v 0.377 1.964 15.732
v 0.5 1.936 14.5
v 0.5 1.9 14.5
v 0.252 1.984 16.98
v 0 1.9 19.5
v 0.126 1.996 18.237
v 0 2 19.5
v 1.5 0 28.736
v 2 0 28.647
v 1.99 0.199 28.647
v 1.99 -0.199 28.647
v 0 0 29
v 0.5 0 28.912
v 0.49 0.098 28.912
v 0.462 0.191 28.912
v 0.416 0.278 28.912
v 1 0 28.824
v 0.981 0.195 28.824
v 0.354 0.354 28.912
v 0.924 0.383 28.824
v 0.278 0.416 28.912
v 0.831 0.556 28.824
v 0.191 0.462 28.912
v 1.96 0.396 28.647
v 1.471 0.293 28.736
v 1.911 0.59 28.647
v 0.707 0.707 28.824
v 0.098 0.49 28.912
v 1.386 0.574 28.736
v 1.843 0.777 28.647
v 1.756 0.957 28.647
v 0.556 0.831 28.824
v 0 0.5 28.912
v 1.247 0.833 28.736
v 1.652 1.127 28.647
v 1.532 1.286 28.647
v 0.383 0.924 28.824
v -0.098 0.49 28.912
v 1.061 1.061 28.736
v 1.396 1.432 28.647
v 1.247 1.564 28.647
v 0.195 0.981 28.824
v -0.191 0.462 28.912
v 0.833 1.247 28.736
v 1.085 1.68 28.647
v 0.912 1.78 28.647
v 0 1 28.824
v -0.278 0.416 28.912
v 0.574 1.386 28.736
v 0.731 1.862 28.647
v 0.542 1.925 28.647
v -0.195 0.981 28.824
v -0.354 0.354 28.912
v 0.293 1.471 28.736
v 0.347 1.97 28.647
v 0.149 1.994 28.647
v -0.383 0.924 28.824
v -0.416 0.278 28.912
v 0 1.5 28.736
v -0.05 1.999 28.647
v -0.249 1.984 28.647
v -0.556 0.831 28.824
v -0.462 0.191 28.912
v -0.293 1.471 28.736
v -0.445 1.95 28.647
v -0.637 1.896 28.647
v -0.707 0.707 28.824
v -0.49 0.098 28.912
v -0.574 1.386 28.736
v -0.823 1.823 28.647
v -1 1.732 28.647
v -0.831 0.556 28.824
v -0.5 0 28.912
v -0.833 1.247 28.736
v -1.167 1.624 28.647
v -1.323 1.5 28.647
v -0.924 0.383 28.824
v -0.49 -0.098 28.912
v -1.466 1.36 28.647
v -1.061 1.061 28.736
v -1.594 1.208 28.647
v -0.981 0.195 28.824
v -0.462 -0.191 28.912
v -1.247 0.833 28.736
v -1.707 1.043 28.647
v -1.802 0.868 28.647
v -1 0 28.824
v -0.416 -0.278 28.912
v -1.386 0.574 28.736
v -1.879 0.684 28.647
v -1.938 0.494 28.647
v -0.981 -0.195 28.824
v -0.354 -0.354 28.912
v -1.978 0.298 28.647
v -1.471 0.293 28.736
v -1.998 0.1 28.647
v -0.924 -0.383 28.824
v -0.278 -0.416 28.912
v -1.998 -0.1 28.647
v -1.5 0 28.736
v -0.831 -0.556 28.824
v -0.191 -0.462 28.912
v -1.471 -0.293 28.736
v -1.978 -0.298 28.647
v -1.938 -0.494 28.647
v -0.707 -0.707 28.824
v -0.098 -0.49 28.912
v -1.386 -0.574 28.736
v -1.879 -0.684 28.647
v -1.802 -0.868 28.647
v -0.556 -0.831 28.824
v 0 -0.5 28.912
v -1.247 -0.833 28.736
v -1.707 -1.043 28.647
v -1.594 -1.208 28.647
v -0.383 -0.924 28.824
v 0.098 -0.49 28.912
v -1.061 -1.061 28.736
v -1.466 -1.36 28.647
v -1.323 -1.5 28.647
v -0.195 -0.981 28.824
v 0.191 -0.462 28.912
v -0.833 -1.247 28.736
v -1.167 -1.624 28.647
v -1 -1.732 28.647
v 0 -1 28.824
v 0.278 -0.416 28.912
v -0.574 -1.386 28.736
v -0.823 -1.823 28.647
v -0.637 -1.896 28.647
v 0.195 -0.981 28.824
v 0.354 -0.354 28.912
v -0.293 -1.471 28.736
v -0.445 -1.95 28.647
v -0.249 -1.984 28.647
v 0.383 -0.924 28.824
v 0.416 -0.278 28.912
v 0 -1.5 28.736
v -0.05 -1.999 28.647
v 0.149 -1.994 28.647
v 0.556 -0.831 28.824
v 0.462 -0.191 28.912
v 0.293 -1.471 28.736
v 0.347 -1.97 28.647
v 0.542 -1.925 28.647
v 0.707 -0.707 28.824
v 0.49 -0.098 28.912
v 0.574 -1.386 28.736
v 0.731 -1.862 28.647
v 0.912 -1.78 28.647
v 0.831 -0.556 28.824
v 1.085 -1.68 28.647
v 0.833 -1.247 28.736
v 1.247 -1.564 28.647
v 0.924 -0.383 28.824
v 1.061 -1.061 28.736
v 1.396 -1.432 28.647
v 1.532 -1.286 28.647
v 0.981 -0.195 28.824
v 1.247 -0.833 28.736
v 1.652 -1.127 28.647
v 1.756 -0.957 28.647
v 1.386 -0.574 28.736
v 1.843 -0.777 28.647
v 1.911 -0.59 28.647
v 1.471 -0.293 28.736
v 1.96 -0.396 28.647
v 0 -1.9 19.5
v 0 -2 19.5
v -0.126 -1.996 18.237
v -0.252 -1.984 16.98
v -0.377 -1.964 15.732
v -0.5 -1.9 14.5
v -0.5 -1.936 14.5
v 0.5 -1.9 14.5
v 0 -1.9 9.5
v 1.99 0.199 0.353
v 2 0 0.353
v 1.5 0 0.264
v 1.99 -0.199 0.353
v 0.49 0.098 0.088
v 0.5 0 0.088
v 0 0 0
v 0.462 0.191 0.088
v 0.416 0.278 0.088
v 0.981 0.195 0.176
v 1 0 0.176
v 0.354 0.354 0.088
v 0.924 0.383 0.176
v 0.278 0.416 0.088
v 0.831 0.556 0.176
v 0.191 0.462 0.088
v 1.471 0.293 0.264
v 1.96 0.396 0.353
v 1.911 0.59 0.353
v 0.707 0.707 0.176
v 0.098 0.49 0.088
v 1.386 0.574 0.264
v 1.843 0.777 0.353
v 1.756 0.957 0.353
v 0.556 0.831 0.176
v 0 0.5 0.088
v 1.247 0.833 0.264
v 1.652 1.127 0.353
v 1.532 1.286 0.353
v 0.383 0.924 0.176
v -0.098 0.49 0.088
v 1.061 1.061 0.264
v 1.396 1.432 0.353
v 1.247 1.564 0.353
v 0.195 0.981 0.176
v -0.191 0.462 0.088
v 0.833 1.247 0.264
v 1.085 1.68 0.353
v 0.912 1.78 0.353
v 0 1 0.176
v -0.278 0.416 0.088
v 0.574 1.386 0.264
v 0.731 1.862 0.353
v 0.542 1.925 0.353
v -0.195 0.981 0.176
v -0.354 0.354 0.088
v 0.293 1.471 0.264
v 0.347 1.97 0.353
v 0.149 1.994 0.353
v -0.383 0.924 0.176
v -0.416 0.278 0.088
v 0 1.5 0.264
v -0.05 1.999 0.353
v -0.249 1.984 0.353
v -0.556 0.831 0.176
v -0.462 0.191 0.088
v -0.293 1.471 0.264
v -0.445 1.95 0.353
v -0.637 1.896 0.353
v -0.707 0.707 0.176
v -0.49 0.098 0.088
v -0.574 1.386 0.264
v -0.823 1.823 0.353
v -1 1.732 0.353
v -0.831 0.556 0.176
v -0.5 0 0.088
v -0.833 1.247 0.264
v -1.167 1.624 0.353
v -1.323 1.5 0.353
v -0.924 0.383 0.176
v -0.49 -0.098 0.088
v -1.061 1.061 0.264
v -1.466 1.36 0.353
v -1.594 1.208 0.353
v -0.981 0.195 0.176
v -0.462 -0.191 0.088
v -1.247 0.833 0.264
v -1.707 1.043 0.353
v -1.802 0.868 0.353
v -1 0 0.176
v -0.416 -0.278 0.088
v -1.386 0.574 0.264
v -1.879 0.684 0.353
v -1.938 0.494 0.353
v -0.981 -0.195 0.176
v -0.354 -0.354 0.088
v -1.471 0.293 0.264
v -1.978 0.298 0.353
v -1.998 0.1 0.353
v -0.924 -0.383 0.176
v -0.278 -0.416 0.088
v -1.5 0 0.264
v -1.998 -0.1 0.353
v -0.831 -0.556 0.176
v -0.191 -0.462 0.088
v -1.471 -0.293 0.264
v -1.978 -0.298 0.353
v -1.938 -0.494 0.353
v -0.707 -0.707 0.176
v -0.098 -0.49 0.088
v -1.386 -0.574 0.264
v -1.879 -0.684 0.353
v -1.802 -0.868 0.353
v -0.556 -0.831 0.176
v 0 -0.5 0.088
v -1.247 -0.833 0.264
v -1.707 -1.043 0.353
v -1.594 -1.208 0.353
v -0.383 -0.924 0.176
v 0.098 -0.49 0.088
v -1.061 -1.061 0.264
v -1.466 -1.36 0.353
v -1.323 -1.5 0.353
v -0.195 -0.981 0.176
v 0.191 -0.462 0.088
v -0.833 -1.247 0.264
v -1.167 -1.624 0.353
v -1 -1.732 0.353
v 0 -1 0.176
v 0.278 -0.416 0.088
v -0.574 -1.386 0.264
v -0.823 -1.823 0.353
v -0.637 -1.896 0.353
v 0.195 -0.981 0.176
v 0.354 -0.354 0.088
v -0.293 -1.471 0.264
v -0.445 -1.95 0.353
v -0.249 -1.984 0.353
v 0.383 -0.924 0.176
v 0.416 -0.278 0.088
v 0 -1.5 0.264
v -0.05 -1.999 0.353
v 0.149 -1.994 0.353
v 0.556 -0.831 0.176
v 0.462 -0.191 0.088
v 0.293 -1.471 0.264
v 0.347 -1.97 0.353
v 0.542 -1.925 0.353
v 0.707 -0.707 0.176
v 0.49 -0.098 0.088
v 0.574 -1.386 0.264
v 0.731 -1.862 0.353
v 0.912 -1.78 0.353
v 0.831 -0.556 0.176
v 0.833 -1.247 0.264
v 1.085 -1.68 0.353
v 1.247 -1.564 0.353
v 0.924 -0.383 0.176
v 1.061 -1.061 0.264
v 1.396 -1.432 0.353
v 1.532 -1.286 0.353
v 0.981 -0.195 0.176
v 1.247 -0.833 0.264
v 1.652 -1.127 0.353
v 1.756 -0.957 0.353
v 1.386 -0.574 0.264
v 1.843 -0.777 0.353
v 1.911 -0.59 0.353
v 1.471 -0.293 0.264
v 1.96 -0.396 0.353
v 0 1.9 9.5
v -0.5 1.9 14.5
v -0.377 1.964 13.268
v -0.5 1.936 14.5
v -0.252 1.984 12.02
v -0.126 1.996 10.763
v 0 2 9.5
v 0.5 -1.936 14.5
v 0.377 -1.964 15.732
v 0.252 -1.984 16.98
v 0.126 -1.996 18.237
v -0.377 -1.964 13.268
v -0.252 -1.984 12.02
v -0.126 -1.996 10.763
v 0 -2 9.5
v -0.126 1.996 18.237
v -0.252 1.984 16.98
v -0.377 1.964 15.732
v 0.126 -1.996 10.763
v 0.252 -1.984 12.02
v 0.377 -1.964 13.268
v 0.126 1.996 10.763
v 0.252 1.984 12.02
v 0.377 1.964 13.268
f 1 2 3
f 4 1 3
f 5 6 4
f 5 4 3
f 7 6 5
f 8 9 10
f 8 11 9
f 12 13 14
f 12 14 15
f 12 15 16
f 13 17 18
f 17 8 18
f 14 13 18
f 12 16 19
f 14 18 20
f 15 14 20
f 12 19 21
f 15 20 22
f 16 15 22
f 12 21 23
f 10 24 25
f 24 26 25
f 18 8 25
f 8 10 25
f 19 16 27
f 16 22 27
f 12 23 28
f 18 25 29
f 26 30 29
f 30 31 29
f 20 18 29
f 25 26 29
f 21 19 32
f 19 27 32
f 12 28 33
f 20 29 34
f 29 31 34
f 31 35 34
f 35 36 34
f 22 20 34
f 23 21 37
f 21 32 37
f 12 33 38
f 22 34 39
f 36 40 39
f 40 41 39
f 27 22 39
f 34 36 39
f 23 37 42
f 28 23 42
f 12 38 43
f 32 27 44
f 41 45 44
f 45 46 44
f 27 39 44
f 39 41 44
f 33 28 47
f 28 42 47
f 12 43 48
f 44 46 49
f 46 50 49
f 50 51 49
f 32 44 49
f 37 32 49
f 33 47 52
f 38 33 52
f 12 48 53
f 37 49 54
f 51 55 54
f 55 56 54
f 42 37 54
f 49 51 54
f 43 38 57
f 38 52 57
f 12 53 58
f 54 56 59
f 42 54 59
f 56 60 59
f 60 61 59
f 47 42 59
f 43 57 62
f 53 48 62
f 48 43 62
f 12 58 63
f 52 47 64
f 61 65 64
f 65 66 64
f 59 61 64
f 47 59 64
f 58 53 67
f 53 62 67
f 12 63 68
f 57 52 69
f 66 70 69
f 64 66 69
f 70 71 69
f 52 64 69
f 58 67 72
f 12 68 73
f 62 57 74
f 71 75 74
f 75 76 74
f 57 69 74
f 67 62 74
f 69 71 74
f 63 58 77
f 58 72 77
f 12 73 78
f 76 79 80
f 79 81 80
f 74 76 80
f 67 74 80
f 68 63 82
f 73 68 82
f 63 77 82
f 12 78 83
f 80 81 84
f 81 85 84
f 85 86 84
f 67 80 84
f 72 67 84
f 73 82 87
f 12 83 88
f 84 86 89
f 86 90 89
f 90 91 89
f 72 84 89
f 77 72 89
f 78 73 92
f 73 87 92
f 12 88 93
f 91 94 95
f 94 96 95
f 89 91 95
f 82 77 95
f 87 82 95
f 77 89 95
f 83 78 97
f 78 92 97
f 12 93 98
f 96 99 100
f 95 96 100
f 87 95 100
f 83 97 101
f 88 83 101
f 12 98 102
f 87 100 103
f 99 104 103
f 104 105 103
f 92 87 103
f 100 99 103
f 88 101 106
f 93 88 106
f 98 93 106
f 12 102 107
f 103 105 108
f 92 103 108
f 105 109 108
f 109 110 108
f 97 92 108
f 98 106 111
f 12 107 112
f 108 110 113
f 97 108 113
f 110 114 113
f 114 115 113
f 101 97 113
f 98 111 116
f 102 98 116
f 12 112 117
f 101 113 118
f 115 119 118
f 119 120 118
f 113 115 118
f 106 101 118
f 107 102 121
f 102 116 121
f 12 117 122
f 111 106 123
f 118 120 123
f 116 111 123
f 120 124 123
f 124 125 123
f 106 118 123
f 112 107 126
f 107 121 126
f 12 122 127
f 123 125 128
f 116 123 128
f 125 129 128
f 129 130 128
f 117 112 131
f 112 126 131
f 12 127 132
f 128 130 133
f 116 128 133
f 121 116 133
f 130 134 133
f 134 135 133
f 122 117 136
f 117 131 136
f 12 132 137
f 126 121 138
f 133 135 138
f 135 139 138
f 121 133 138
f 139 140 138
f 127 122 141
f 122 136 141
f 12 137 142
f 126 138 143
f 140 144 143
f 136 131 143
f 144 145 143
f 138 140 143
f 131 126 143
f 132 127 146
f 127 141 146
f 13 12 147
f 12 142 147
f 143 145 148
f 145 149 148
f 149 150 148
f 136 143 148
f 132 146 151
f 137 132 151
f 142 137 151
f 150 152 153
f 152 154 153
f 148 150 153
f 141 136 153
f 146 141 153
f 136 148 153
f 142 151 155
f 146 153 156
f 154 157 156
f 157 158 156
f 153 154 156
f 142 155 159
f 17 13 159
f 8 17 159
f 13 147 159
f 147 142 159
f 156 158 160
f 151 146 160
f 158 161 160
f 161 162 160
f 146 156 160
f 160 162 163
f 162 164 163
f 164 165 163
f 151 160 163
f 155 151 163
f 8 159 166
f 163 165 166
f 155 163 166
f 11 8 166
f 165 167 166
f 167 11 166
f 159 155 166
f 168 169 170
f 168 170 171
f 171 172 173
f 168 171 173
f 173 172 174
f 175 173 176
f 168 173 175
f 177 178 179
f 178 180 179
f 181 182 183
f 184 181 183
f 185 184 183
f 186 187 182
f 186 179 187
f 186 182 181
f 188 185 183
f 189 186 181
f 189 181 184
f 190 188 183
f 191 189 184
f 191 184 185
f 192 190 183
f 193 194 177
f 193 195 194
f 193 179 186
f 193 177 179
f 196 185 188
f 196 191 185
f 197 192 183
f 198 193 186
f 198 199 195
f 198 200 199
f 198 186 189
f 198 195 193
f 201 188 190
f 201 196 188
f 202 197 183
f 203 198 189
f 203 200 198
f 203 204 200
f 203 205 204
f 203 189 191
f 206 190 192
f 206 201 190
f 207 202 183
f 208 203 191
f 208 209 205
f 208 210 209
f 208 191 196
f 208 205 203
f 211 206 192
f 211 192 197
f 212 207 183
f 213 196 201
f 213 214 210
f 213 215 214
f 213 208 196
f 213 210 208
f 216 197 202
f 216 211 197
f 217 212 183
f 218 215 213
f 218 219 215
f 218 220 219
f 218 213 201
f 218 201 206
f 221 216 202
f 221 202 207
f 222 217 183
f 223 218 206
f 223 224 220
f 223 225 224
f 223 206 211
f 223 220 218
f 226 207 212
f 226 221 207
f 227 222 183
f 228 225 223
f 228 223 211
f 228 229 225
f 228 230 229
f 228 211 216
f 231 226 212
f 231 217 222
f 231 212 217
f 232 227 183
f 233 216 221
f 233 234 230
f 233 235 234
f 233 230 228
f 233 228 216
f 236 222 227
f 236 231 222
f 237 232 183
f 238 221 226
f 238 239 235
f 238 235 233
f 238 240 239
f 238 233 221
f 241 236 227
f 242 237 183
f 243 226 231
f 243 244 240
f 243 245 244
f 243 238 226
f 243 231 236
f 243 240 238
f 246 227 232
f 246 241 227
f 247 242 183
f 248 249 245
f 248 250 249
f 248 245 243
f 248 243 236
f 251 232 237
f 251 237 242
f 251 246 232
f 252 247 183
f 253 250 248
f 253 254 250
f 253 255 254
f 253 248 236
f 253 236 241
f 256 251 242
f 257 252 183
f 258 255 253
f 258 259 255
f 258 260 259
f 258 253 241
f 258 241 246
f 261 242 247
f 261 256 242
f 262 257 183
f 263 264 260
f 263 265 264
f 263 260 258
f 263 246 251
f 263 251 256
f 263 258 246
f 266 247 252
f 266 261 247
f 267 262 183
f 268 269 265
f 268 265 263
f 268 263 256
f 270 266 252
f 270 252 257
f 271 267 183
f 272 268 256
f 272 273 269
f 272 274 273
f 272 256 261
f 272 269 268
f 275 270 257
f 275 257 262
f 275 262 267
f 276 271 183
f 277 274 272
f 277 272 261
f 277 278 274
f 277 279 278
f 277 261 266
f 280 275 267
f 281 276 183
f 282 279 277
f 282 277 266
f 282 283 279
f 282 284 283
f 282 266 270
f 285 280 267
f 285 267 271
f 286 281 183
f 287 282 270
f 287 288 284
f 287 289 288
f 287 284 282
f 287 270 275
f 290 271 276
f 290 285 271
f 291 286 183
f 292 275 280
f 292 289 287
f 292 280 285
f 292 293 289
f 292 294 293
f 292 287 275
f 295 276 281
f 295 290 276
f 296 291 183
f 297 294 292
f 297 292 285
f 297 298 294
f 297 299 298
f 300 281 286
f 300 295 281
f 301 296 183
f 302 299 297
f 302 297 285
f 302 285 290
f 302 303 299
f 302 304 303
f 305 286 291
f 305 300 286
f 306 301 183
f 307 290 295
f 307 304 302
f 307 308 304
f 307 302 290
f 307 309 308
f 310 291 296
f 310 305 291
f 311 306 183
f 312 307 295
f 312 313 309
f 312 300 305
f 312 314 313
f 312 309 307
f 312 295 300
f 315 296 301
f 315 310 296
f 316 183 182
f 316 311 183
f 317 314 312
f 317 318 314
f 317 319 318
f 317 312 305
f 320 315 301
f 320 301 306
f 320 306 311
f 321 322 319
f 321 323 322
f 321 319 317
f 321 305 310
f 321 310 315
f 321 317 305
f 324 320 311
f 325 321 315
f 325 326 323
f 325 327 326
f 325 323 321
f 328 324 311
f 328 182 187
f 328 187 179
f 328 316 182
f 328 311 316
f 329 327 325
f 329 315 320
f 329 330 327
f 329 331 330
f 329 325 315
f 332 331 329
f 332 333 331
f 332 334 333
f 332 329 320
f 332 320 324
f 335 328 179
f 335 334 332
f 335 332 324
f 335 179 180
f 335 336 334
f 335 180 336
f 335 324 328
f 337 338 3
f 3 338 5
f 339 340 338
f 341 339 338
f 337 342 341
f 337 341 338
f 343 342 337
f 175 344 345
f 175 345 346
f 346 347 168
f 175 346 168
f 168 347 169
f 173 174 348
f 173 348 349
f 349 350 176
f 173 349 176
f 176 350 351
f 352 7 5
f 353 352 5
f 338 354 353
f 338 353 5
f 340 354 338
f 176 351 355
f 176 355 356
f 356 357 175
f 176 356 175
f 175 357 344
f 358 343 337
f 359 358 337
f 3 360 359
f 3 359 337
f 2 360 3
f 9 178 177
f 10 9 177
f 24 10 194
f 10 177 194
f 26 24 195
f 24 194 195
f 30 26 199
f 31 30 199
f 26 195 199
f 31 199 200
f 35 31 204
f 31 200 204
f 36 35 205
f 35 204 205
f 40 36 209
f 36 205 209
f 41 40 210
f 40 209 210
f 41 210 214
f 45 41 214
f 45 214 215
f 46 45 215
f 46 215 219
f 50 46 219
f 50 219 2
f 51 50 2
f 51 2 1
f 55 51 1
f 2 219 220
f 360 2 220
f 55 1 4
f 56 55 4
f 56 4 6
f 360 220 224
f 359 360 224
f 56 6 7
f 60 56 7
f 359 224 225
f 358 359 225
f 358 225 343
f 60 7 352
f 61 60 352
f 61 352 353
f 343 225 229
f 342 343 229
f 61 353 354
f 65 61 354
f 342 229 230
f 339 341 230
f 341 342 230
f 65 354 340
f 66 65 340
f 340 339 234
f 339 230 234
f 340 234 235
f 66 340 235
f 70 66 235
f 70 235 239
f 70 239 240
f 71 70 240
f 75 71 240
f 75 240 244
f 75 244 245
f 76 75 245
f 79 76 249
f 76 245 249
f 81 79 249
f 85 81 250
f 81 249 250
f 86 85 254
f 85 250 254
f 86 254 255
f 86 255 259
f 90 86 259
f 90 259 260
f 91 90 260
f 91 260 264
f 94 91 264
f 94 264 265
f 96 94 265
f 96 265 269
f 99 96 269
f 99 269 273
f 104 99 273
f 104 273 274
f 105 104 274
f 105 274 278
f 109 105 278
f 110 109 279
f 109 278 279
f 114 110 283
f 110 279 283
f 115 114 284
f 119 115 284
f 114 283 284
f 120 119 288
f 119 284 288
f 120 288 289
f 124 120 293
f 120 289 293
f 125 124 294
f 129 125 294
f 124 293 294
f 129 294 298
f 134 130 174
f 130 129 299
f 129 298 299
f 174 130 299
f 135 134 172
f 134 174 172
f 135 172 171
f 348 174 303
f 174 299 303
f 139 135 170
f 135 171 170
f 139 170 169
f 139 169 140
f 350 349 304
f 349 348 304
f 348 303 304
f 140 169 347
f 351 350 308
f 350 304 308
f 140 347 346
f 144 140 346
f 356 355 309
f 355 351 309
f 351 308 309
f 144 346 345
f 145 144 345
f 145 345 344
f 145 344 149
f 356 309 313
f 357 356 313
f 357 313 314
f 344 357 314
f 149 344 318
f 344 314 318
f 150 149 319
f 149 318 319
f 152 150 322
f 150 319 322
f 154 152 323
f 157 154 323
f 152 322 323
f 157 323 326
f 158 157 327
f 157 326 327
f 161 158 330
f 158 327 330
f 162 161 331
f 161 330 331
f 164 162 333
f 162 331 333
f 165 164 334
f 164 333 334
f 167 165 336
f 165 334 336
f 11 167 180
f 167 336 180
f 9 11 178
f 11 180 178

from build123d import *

# Parameters (mm, degrees)
F0_R       = 2
F1_DEPTH   = 29
F2_SIZE2   = 0.3526539614
F2_SIZE    = 2
F2_2_SIZE2 = 0.3526539614
F2_2_SIZE  = 2
F5_DEPTH   = 0.1


# Not quite as in the source:
# - a pattern or mirror of a feature is missing from the dataset's text; its kind, count and spacing are read off the source's solid


with BuildPart() as f1:
    # F0 (on Top) → F1 (new body)
    with BuildSketch(Plane.XY):
        Circle(F0_R)
    extrude(amount=F1_DEPTH)

    # F2
    f2_edges = [f1.edges().sort_by_distance(p)[0] for p in [
        (-2, 0, 29),
    ]]
    f2_side = f1.faces().sort_by_distance((0, 0, 29))[0]
    chamfer(f2_edges, length=F2_SIZE, length2=F2_SIZE2, reference=f2_side)

    # F2#2
    f2_2_edges = [f1.edges().sort_by_distance(p)[0] for p in [
        (-2, 0, 0),
    ]]
    f2_2_side = f1.faces().sort_by_distance((0, 0, 0))[0]
    chamfer(f2_2_edges, length=F2_2_SIZE, length2=F2_2_SIZE2, reference=f2_2_side)

    # F4 (on offset) → F5 (cut)
    with BuildSketch(Plane.XZ.offset(2)):
        Polygon((0.5, 14.5), (0, 19.5), (-0.5, 14.5), (0, 9.5), align=None)
    f5 = extrude(amount=-F5_DEPTH, mode=Mode.SUBTRACT)

    # F5_copies: F5 across plane
    add(f5.mirror(Plane.ZX), mode=Mode.SUBTRACT)


solid = f1.part
